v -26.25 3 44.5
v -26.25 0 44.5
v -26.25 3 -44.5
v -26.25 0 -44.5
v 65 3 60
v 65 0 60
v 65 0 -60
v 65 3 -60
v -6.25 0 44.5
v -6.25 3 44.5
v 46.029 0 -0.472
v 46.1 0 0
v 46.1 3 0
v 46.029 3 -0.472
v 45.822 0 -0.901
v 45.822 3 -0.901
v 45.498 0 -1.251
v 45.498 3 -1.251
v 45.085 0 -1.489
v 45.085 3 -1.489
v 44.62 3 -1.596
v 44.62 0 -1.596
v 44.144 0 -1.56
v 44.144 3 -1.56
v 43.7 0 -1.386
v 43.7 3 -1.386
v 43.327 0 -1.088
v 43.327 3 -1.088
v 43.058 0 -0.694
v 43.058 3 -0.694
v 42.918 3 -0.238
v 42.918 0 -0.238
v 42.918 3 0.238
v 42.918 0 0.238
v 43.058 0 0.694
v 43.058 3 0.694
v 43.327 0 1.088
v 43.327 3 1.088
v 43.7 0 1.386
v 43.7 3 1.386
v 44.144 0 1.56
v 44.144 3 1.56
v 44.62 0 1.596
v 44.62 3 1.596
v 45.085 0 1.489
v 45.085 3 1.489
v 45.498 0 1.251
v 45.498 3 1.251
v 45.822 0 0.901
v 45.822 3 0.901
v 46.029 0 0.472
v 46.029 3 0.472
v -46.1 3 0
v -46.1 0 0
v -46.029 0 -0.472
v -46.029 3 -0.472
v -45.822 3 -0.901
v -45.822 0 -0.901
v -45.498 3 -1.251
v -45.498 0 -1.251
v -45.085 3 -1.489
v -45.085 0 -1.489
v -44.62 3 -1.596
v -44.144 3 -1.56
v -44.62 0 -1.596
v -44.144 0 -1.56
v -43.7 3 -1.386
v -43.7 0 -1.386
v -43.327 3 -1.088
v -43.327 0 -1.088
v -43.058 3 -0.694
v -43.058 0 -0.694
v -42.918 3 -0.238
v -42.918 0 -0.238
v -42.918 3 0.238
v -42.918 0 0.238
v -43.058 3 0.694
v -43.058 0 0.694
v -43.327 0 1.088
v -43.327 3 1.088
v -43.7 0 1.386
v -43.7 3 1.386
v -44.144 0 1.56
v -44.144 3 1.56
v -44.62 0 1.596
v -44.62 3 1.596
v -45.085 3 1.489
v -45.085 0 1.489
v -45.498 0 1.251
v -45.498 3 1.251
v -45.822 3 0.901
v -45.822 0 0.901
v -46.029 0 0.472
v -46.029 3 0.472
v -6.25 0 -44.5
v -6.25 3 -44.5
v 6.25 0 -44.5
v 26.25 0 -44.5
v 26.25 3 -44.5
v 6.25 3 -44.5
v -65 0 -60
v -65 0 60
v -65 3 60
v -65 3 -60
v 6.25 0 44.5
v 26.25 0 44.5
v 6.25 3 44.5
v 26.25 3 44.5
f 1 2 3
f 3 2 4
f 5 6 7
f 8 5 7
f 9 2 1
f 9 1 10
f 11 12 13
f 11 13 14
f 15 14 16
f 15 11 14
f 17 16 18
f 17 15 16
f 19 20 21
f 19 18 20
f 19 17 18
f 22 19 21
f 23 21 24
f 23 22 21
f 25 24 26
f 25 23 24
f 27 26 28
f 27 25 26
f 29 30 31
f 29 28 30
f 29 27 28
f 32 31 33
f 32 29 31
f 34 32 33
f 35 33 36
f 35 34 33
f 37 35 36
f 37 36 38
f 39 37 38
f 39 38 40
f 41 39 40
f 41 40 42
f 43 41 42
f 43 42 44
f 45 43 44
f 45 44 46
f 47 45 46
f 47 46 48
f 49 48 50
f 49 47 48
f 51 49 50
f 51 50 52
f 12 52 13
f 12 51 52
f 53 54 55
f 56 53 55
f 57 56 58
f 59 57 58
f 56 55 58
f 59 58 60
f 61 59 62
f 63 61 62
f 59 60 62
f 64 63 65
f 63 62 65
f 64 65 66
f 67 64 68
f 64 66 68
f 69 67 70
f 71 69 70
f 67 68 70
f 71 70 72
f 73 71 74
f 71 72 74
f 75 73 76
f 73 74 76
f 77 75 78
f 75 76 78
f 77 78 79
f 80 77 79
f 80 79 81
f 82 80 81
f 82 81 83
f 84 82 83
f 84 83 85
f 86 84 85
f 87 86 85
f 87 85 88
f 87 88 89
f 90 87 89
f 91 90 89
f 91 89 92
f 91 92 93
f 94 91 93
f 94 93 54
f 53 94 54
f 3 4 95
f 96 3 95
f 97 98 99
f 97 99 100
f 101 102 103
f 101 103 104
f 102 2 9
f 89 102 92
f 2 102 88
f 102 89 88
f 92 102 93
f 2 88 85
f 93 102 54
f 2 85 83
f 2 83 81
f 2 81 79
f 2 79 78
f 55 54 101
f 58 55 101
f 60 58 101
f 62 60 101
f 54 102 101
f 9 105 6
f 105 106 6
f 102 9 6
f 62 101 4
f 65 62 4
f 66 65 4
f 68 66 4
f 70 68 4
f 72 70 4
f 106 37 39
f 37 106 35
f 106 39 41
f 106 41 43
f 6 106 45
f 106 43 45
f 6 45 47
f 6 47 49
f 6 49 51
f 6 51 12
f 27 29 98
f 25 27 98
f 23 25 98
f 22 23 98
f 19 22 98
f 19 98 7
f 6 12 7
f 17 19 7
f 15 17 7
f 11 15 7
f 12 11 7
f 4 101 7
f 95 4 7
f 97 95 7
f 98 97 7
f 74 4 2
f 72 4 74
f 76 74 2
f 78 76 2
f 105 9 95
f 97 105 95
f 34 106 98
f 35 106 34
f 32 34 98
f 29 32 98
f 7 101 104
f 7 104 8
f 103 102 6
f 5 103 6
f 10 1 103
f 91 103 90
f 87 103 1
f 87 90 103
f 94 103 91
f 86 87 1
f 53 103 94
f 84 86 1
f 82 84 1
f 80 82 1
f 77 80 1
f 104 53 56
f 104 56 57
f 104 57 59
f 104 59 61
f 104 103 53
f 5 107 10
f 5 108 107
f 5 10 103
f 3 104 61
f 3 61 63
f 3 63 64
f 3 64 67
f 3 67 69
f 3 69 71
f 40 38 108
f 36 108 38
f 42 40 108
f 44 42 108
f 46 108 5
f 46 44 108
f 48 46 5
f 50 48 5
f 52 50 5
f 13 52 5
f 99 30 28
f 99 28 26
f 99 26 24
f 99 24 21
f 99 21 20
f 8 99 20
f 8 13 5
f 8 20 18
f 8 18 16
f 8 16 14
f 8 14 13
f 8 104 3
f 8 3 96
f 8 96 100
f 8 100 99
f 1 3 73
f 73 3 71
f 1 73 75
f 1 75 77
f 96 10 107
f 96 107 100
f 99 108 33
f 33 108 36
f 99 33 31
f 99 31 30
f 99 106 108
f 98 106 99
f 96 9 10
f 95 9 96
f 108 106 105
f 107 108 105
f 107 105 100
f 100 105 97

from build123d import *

# Parameters (mm, degrees)
SKETCH1_W           = 130
SKETCH1_H           = 120
BOSS_EXTRUDE1_DEPTH = 3
CUT_EXTRUDE1_START  = -4
SKETCH2_W           = 20
SKETCH2_H           = 89
CUT_EXTRUDE1_DEPTH  = 5
CUT_EXTRUDE2_START  = -4
SKETCH3_R           = 1.6
CUT_EXTRUDE2_DEPTH  = 5


with BuildPart() as part:
    # Sketch1 → Boss-Extrude1 (new body)
    with BuildSketch(Plane(origin=(0, 0, 0), x_dir=(1, 0, 0), z_dir=(0, 1, 0))):
        Rectangle(SKETCH1_W, SKETCH1_H)
    extrude(amount=BOSS_EXTRUDE1_DEPTH)

    # Sketch2 → Cut-Extrude1 (cut)
    with BuildSketch(Plane(origin=(0, 3, 0), x_dir=(1, 0, 0), z_dir=(0, 1, 0)).offset(CUT_EXTRUDE1_START)):
        with Locations((-16.25, 0)):
            Rectangle(SKETCH2_W, SKETCH2_H)
    cut_extrude1 = extrude(amount=CUT_EXTRUDE1_DEPTH, mode=Mode.SUBTRACT)

    # Mirror1: Cut-Extrude1 across plane
    add(cut_extrude1.mirror(Plane(origin=(0, 0, 0), x_dir=(0, 0, 1), z_dir=(1, 0, 0))), mode=Mode.SUBTRACT)

    # Sketch3 → Cut-Extrude2 (cut)
    with BuildSketch(Plane(origin=(0, 3, 0), x_dir=(1, 0, 0), z_dir=(0, 1, 0)).offset(CUT_EXTRUDE2_START)):
        with Locations((44.5, 0)):
            Circle(SKETCH3_R)
    cut_extrude2 = extrude(amount=CUT_EXTRUDE2_DEPTH, mode=Mode.SUBTRACT)

    # Mirror2: Cut-Extrude2 across plane
    add(cut_extrude2.mirror(Plane(origin=(0, 0, 0), x_dir=(0, 0, 1), z_dir=(1, 0, 0))), mode=Mode.SUBTRACT)


solid = part.part
